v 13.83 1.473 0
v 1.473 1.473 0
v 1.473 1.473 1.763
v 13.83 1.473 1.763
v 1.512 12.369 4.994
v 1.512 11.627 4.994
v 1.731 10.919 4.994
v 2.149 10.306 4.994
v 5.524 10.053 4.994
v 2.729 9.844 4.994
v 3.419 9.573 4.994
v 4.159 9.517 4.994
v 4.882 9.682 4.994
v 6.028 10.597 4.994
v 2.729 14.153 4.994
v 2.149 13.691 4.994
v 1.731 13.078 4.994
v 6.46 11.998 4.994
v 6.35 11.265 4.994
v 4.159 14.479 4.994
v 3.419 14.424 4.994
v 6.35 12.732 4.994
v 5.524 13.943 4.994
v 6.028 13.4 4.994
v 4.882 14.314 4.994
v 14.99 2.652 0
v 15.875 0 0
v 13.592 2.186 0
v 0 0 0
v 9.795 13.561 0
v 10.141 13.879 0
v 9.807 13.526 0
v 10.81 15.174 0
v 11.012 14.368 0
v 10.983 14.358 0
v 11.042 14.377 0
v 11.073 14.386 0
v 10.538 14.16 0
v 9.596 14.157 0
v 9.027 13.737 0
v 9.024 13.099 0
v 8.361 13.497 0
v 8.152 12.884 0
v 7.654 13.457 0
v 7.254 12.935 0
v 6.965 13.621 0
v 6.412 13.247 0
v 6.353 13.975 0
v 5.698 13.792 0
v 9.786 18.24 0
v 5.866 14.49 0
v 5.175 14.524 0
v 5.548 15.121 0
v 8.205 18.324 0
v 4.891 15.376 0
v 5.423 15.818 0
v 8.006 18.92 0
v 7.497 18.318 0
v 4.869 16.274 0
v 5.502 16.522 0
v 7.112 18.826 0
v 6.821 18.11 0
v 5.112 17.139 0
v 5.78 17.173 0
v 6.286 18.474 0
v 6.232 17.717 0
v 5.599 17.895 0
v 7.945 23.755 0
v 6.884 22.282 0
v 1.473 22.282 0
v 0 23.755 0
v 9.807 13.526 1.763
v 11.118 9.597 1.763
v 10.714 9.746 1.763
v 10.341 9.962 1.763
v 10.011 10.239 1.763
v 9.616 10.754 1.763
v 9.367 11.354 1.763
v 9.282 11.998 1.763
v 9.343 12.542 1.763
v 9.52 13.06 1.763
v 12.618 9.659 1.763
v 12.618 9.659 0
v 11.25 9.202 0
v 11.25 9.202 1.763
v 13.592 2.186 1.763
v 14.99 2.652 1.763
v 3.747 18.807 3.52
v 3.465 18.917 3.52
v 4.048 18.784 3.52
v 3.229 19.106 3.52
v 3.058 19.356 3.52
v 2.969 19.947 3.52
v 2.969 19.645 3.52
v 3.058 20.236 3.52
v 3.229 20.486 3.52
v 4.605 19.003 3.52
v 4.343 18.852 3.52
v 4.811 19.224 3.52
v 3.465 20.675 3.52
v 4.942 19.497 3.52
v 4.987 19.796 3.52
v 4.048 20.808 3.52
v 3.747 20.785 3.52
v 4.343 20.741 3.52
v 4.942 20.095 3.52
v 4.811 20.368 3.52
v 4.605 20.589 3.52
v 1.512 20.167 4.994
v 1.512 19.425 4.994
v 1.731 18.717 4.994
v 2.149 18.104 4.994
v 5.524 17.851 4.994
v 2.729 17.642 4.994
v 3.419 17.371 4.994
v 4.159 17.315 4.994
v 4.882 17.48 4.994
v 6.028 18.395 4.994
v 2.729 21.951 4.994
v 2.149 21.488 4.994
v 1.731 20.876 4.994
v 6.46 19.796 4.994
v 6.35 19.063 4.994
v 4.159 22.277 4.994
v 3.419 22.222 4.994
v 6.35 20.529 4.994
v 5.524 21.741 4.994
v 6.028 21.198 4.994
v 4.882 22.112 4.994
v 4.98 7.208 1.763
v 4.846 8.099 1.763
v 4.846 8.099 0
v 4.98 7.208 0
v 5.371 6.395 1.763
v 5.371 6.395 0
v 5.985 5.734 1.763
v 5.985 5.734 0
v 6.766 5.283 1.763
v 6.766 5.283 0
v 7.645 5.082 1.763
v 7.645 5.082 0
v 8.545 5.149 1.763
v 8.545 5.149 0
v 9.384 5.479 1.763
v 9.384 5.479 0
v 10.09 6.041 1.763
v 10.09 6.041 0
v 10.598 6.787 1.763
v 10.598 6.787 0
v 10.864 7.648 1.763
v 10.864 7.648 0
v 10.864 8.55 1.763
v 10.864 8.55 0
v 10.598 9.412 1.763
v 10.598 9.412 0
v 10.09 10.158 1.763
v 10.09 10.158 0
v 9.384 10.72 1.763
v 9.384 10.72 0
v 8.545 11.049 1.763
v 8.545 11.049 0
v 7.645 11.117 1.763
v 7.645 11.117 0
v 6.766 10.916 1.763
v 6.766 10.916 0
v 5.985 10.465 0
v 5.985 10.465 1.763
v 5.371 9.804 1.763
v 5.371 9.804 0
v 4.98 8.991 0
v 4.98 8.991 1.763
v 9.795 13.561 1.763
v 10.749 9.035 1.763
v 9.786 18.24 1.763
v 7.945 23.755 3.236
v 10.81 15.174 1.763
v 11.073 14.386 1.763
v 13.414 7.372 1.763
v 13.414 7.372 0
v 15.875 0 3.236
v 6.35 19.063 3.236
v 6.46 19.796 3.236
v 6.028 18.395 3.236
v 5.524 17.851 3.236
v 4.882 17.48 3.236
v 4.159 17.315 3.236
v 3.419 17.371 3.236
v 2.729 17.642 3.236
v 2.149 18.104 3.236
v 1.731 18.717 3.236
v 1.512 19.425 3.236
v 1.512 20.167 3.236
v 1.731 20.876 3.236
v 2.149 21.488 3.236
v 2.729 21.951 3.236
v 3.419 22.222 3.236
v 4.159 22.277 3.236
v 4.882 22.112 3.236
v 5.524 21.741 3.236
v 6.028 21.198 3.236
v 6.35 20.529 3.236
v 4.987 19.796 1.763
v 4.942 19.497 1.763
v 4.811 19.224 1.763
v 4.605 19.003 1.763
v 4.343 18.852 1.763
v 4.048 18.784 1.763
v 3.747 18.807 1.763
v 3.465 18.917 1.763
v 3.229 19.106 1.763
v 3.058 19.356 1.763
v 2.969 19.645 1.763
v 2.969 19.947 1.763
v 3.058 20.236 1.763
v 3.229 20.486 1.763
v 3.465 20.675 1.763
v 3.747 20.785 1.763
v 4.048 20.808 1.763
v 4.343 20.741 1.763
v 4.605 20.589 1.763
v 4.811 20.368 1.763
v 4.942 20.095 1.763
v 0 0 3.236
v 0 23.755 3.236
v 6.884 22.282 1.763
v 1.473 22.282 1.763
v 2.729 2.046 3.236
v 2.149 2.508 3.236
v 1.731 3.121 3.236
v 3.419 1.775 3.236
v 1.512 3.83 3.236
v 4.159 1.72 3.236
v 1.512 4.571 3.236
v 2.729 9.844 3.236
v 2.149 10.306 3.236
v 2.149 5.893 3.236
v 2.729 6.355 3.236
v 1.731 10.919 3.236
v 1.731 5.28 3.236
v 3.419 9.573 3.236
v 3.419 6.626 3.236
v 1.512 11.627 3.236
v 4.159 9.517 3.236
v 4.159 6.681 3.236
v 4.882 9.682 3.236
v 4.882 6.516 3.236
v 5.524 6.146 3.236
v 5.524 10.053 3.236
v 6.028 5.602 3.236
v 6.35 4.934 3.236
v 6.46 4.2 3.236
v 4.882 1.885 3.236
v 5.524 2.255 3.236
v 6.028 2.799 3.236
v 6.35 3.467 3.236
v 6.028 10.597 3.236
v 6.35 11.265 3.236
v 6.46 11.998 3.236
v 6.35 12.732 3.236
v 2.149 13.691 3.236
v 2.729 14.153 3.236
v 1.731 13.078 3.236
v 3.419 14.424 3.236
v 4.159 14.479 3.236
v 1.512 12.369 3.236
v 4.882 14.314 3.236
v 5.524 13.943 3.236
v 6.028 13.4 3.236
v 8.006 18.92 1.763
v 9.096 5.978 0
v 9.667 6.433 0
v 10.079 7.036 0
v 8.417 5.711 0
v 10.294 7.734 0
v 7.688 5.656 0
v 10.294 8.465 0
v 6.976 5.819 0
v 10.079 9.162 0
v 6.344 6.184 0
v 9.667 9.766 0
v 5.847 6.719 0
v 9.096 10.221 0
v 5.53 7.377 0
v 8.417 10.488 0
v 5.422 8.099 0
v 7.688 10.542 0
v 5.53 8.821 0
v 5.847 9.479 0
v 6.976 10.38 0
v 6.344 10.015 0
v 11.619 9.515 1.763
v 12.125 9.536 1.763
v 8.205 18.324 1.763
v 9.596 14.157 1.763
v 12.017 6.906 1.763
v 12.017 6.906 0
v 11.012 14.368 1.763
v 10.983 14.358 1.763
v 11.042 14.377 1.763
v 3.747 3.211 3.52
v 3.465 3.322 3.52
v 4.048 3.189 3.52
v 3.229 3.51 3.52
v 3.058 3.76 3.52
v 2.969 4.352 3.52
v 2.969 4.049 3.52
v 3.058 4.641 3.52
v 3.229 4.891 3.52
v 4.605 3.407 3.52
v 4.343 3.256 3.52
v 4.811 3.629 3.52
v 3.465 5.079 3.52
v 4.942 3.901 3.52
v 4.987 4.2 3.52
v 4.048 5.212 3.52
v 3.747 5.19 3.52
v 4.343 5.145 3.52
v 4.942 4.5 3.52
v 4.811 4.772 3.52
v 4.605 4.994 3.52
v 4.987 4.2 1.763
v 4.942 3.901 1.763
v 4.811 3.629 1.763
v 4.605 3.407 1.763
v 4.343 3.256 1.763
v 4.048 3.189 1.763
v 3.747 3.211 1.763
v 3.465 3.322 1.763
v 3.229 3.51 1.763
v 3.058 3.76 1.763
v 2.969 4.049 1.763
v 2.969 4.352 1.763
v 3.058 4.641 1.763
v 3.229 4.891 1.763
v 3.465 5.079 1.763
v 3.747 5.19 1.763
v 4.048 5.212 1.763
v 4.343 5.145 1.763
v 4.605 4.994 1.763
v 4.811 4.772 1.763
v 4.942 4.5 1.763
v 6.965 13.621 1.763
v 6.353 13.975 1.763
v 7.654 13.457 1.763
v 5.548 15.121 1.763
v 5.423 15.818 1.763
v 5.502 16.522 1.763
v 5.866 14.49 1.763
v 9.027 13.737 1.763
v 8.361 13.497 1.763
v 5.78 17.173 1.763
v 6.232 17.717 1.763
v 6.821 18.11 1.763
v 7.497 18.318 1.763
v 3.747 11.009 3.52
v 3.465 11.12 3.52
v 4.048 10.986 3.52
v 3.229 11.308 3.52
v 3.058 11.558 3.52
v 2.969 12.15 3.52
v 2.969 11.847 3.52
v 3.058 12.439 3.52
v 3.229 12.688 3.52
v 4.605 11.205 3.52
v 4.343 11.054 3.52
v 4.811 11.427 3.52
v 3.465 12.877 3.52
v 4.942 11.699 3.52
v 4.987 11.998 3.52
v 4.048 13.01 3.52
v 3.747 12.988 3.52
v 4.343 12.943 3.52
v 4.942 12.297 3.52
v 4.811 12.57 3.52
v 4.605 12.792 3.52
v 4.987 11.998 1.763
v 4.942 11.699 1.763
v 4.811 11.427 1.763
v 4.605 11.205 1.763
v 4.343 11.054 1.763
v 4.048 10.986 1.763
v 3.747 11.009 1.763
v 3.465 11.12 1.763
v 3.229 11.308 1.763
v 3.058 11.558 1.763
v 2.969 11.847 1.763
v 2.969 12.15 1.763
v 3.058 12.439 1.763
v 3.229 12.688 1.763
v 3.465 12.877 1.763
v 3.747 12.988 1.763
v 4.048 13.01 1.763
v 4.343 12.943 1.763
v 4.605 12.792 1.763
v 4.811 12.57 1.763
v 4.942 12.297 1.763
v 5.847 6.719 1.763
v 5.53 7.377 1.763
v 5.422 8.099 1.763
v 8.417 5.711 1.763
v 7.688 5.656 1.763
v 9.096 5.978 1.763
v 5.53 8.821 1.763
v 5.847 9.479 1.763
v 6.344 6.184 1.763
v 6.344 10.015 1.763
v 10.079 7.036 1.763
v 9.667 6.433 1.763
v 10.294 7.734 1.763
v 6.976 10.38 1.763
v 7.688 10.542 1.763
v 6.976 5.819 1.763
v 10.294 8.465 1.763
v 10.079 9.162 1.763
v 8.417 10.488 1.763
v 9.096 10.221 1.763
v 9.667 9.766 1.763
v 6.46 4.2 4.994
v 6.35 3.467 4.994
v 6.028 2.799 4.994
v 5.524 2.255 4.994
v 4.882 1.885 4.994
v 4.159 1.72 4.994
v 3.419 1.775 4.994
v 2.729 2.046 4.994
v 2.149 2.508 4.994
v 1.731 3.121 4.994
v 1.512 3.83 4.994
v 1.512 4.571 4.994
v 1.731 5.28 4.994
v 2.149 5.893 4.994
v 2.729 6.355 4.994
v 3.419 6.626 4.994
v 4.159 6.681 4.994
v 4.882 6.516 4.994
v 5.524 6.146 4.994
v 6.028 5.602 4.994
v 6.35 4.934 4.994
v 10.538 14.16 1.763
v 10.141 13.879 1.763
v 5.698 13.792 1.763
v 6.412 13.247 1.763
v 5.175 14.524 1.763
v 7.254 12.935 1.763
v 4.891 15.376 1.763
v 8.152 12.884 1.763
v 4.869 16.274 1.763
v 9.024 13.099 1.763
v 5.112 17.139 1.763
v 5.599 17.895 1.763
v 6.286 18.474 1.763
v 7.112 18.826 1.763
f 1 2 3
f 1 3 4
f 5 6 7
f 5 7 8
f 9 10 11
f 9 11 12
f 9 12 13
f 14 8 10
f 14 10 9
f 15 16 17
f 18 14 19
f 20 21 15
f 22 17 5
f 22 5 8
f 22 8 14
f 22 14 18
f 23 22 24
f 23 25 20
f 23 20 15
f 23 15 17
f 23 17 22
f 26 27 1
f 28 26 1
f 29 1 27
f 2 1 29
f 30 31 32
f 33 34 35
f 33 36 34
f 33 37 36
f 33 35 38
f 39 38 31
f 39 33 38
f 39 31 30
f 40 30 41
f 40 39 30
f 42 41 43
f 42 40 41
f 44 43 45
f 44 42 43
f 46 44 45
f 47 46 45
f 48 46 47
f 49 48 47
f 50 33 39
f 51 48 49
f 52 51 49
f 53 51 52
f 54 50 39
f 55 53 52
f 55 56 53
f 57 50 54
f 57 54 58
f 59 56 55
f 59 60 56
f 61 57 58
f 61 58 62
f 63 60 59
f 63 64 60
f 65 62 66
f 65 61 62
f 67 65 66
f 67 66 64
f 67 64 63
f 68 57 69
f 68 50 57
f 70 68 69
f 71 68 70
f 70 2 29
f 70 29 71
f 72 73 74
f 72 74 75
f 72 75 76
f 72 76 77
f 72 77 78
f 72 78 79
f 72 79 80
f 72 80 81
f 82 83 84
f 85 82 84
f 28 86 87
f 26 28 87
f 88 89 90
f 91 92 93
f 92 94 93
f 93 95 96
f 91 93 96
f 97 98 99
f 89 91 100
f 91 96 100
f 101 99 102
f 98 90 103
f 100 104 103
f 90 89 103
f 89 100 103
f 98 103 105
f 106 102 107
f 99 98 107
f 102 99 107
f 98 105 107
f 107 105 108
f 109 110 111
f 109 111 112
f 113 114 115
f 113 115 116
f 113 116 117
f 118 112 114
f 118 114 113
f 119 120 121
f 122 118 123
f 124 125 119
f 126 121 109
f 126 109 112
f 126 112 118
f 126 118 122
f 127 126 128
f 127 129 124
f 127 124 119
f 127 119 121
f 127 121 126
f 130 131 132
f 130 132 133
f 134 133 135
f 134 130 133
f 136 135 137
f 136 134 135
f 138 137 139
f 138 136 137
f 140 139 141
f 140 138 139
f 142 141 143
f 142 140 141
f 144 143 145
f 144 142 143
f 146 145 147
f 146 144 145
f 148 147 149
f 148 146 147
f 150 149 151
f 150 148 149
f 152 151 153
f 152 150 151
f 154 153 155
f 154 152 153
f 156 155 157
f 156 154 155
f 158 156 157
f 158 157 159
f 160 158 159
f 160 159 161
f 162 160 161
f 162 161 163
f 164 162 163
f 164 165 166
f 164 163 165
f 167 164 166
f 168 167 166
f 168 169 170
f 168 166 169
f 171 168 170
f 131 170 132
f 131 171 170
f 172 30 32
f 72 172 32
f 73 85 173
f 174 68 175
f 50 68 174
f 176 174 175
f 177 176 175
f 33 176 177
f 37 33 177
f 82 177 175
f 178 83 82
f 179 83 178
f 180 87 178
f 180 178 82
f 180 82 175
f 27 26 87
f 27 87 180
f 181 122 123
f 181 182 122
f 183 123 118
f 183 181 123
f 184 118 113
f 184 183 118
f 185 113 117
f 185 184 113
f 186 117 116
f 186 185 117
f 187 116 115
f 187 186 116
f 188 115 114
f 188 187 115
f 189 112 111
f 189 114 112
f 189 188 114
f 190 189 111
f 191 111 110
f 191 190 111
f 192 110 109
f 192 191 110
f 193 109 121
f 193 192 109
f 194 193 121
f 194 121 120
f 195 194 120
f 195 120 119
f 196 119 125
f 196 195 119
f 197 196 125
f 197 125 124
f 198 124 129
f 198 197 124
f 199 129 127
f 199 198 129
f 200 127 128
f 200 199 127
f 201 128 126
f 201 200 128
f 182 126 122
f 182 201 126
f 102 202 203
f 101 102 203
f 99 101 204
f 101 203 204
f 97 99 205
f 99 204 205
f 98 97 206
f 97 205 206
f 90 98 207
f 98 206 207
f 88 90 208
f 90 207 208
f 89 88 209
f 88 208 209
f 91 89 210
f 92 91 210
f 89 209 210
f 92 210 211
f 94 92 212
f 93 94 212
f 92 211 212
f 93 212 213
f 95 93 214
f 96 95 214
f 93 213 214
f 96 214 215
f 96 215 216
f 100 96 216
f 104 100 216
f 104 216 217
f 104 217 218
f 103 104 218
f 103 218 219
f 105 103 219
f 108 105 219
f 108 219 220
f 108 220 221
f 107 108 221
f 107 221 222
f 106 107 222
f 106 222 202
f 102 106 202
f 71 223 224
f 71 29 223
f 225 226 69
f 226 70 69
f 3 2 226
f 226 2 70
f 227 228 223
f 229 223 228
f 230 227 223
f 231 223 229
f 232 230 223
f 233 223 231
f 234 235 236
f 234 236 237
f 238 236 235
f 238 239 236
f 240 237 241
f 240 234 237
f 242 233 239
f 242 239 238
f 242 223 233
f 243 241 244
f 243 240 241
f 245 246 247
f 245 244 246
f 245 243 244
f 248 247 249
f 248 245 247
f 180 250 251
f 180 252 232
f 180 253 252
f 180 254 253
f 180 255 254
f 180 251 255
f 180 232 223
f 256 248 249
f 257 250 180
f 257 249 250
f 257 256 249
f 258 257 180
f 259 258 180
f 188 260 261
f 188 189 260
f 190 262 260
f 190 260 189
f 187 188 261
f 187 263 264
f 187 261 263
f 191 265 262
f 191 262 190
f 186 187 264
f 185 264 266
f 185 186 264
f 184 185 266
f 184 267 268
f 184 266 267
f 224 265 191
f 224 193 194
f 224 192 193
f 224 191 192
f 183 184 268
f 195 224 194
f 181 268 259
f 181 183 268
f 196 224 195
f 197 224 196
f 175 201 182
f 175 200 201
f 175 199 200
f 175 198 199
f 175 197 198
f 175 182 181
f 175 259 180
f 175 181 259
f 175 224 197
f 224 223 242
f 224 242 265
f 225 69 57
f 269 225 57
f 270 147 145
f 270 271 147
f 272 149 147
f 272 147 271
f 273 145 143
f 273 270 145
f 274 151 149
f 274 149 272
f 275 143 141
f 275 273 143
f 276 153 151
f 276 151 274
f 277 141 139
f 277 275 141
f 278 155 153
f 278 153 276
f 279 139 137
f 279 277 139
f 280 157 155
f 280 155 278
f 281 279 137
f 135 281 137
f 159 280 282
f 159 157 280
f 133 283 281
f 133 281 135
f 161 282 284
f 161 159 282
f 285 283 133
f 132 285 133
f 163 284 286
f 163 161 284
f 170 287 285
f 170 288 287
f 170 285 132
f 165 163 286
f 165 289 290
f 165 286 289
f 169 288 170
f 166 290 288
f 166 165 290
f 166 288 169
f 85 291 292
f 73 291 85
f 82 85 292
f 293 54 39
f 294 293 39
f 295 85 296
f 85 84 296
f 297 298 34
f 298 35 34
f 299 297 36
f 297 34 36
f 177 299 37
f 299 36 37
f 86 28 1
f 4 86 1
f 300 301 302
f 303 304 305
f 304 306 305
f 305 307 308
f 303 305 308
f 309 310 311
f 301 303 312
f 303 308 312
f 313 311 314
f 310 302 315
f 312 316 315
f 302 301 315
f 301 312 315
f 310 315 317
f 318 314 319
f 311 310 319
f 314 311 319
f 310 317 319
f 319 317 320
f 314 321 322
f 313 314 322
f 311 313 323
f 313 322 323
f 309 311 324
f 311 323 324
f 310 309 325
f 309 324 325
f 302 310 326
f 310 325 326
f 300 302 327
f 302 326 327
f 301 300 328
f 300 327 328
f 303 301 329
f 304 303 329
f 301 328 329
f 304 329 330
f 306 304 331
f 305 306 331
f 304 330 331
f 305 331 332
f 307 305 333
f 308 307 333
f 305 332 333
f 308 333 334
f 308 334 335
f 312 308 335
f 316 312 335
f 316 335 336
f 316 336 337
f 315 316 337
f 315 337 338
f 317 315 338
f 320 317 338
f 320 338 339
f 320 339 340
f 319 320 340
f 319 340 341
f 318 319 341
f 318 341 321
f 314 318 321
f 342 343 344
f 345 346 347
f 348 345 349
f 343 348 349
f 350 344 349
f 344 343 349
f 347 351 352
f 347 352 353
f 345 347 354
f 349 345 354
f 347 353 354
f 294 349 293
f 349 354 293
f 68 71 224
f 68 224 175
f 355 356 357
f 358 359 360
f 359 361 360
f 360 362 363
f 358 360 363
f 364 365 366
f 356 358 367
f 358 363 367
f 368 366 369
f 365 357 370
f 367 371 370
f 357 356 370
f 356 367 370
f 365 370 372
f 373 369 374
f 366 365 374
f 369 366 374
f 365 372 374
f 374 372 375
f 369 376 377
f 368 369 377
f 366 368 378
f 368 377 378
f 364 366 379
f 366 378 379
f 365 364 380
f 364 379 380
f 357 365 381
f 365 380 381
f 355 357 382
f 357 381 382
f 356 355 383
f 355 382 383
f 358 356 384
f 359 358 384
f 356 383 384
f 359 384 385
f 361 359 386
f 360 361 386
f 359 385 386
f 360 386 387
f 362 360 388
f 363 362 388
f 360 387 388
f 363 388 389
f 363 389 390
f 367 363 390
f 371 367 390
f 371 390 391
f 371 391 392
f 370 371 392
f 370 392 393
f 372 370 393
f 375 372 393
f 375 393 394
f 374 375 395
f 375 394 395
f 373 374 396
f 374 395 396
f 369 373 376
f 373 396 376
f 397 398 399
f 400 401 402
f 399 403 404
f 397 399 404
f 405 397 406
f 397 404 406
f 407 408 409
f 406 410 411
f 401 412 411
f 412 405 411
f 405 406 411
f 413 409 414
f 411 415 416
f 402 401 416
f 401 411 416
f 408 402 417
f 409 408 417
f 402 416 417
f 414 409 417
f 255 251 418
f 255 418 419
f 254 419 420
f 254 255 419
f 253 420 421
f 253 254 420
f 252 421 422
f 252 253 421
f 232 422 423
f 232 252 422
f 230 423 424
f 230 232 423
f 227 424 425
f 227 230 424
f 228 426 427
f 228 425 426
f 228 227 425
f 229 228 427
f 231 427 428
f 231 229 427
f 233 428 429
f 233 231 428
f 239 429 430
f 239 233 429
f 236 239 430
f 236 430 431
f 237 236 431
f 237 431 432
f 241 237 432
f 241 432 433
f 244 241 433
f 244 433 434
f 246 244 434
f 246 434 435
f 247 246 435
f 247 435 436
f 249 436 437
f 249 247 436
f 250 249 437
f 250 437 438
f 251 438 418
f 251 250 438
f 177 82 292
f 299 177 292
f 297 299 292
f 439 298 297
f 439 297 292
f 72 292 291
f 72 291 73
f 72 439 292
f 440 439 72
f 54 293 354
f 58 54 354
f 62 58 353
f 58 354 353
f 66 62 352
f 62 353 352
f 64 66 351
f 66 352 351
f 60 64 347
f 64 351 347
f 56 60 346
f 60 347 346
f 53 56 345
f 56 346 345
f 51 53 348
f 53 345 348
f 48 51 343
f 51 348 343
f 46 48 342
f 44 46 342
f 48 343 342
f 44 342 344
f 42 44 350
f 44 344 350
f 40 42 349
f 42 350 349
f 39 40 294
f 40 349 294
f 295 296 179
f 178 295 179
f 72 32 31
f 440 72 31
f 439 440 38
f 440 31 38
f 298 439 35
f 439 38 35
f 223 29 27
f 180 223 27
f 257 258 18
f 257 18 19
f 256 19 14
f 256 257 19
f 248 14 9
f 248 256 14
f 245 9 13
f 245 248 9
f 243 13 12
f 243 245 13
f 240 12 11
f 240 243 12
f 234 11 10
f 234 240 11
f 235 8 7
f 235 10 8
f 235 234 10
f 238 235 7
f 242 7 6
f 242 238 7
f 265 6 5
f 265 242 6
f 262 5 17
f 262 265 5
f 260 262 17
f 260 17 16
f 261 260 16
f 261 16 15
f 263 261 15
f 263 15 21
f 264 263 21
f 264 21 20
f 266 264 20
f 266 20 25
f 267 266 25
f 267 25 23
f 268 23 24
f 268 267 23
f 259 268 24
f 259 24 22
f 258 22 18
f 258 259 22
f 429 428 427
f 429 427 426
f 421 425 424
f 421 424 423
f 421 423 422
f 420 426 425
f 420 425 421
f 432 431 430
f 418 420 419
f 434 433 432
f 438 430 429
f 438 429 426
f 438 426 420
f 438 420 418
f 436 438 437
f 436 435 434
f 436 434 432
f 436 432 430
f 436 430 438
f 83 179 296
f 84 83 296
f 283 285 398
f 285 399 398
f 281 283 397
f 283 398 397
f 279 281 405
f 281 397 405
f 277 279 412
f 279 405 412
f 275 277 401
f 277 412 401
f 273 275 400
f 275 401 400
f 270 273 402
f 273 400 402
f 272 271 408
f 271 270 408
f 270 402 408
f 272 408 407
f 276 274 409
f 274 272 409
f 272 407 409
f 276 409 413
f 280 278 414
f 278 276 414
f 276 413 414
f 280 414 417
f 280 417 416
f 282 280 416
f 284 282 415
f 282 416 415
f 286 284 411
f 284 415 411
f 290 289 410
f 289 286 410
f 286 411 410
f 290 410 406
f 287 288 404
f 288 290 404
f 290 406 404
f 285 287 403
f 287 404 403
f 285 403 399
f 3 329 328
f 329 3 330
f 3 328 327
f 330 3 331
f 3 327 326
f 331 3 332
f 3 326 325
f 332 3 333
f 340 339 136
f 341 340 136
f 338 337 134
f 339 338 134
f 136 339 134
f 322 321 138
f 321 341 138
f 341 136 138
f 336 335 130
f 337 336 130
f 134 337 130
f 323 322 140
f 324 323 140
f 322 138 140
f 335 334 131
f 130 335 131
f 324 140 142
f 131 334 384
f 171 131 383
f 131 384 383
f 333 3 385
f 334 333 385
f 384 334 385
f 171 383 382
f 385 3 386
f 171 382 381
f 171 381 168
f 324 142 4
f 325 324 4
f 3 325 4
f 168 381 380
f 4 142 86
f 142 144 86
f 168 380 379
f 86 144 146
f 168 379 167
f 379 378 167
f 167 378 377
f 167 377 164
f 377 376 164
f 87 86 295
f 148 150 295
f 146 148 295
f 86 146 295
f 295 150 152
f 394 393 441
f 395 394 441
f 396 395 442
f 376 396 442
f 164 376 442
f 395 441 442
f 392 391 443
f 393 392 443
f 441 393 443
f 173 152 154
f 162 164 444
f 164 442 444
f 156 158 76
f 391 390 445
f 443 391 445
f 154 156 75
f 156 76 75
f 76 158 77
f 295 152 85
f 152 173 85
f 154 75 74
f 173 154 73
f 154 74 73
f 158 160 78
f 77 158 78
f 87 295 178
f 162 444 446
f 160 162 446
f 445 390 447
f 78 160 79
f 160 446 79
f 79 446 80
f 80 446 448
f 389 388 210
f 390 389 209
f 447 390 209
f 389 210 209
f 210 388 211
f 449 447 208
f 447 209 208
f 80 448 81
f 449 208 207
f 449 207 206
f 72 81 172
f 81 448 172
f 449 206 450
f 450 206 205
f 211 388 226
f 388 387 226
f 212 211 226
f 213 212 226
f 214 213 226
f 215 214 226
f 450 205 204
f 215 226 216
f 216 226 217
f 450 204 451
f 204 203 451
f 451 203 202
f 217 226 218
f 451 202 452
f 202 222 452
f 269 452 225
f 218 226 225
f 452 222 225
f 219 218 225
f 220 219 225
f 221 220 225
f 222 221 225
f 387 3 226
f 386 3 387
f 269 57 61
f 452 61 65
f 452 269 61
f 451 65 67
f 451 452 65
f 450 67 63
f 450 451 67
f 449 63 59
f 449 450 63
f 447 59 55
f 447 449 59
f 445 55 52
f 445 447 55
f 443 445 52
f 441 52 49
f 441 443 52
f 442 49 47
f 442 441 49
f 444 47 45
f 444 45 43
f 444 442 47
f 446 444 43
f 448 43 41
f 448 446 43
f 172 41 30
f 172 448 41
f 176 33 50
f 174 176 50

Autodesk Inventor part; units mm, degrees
ref_plane "YZ Plane" through (0, 0, 0) normal (1, 0, 0) x (0, 1, 0)
ref_plane "XZ Plane" through (0, 0, 0) normal (0, 1, 0) x (-1, 0, 0)
ref_plane "XY Plane" through (0, 0, 0) normal (0, 0, 1) x (1, 0, 0)
sketch "Sketch1" plane through (0, 0, 0) normal (0, 0, 1) x (1, 0, 0)
  line L0 (0, 0) -> (0, 23.7553)
  line L1 (0, 0) -> (15.875, 0)
  line L2 (0, 23.7553) -> (7.9451, 23.7553)
  line L3 (7.9451, 23.7553) -> (15.875, 0)
  line L4 (7.9451, 23.7553) -> (31.7005, 23.7553) construction
  line L5 (0, 23.7553) -> (0, 15.8369)
  line L6 (0, 0) -> (0, 7.9184)
  dimension "d0" = 23.7553
  dimension "d1" = 15.875
  dimension "d2" = 7.9451
  dimension "d10" = 7.9185
extrude "Extrusion2" add sketch "Sketch1" along normal blind 3.236
sketch "Sketch3" plane through (0, 0, 3.236) normal (0, 0, 1) x (1, 0, 0)
  line L0 (15.875, 0) -> (7.9451, 23.7553) projected
  line L1 (0, 0) -> (15.875, 0) projected
  line L2 (7.9451, 23.7553) -> (7.9451, 0)
  line L3 (7.9451, 23.7553) -> (0, 23.7553) projected
  line L4 (0, 23.7553) -> (0, 15.8369)
  line L5 (0, 23.7553) -> (0, 0) projected
  line L6 (0, 15.8369) -> (0, 7.9184)
  circle A0 centre (3.9726, 19.7961) radius 2.4879
  dimension "d17" = 4.9759
extrude "Extrusion3" add sketch "Sketch3" along normal blind 1.7577 contours A0
pattern_linear "Rectangular Pattern2" count 3 spacing 7.7978 along (0, -1, 0) of "Extrusion3"
shell "Shell1" thickness 1.4732 removed faces 1 at (7.94, 7.9185, 0)
sketch "Sketch5" plane through (13.8301, 1.4732, 1.7628) normal (0, 0, -1) x (-1, 0, 0)
  circle A0 centre (5.9587, 6.6262) radius 2.4498
  circle A1 centre (5.9587, 6.6262) radius 3.0259
  circle A2 centre (9.8576, 2.7273) radius 2.4879 construction
  circle A3 centre (9.8576, 10.5251) radius 2.4879 construction
  line L0 (9.8576, 10.5251) -> (2.0598, 10.5251) construction
  line L1 (2.0598, 10.5251) -> (2.0598, 2.7273) construction
  line L2 (2.0598, 2.7273) -> (9.8576, 2.7273) construction
  line L3 (9.8576, 2.7273) -> (9.8576, 10.5251) construction
  line L4 (9.8576, 10.5251) -> (2.0598, 2.7273) construction
  point P0 (13.8301, -1.4732)
  dimension "d39" = 7.7978
  dimension "d40" = 7.7978
  dimension "d41" = 4.8997
extrude "Extrusion4" add sketch "Sketch5" along normal up to surface (1.7628 mm away)
pattern_linear "Rectangular Pattern3" count 2 spacing 7.7978 along (0, 1, 0) of "Extrusion4"
sketch "Sketch6" plane through (0, 0, 0) normal (0, 0, -1) x (-1, 0, 0)
  circle A0 centre (-3.9726, 4.2005) radius 2.4879 projected
  line L0 (-3.9726, 4.2005) -> (-11.7704, 4.2005) construction
  arc A1 (-12.5581, 1.8406) -> (-10.9826, 6.5604) centre (-11.7704, 4.2005) ccw
  circle A2 centre (-7.8715, 8.0994) radius 3.0259 projected
  line L1 (-10.9826, 6.5604) -> (-20.4448, 9.7191)
  line L2 (-12.5581, 1.8406) -> (-25.2023, 6.0614)
  line L3 (-25.2023, 6.0614) -> (-20.4448, 9.7191)
  line L4 (-15.875, 0) -> (-10.8097, 15.174) projected
  point P0 (0, 0)
  dimension "d42" = 7.7978
extrude "Extrusion5" cut sketch "Sketch6" against normal up to surface (1.7628 mm away) contours A1 L2 L4 L1 | L2 L3 L1 L4
sketch "Sketch7" plane through (0, 0, 0) normal (0, 0, -1) x (-1, 0, 0)
  circle A0 centre (-3.9726, 11.9983) radius 2.4879 projected
  line L0 (-3.9726, 11.9983) -> (-11.7704, 11.9983) construction
  circle A1 centre (-11.7704, 11.9983) radius 2.4879
  circle A2 centre (-7.8715, 8.0994) radius 3.0259 projected
  line L1 (-13.4141, 7.3721) -> (-10.8097, 15.174) projected
  line L2 (-11.0726, 14.3864) -> (-8.7367, 21.384)
  line L3 (-8.7367, 21.384) -> (-11.249, 21.384)
  line L4 (-11.249, 21.384) -> (-14.0474, 13.0007)
  line L5 (-25.9039, 14.0934) -> (-10.7493, 9.0346)
  line L6 (-24.9299, 19.014) -> (-10.9826, 14.3582)
  line L7 (-24.9299, 19.014) -> (-25.9039, 14.0934)
  line L8 (-10.7493, 9.0346) -> (-11.1181, 9.5974)
  line L9 (-12.0167, 6.9056) -> (-9.7949, 13.5613) projected
  point P0 (0, 0)
  dimension "d45" = 7.7978
extrude "Extrusion6" cut sketch "Sketch7" against normal up to surface (1.7628 mm away) contours L1 A1 L9 | A1 L9 | L5 L9 L8 | L5 L7 L6 L4 A1 | A1 L1 | L9 L5 A1 | L4 L6 A1 | L6 L4 L3 L2 L1
properties part number "3x1 diagonal" material "ABS Plastic"
